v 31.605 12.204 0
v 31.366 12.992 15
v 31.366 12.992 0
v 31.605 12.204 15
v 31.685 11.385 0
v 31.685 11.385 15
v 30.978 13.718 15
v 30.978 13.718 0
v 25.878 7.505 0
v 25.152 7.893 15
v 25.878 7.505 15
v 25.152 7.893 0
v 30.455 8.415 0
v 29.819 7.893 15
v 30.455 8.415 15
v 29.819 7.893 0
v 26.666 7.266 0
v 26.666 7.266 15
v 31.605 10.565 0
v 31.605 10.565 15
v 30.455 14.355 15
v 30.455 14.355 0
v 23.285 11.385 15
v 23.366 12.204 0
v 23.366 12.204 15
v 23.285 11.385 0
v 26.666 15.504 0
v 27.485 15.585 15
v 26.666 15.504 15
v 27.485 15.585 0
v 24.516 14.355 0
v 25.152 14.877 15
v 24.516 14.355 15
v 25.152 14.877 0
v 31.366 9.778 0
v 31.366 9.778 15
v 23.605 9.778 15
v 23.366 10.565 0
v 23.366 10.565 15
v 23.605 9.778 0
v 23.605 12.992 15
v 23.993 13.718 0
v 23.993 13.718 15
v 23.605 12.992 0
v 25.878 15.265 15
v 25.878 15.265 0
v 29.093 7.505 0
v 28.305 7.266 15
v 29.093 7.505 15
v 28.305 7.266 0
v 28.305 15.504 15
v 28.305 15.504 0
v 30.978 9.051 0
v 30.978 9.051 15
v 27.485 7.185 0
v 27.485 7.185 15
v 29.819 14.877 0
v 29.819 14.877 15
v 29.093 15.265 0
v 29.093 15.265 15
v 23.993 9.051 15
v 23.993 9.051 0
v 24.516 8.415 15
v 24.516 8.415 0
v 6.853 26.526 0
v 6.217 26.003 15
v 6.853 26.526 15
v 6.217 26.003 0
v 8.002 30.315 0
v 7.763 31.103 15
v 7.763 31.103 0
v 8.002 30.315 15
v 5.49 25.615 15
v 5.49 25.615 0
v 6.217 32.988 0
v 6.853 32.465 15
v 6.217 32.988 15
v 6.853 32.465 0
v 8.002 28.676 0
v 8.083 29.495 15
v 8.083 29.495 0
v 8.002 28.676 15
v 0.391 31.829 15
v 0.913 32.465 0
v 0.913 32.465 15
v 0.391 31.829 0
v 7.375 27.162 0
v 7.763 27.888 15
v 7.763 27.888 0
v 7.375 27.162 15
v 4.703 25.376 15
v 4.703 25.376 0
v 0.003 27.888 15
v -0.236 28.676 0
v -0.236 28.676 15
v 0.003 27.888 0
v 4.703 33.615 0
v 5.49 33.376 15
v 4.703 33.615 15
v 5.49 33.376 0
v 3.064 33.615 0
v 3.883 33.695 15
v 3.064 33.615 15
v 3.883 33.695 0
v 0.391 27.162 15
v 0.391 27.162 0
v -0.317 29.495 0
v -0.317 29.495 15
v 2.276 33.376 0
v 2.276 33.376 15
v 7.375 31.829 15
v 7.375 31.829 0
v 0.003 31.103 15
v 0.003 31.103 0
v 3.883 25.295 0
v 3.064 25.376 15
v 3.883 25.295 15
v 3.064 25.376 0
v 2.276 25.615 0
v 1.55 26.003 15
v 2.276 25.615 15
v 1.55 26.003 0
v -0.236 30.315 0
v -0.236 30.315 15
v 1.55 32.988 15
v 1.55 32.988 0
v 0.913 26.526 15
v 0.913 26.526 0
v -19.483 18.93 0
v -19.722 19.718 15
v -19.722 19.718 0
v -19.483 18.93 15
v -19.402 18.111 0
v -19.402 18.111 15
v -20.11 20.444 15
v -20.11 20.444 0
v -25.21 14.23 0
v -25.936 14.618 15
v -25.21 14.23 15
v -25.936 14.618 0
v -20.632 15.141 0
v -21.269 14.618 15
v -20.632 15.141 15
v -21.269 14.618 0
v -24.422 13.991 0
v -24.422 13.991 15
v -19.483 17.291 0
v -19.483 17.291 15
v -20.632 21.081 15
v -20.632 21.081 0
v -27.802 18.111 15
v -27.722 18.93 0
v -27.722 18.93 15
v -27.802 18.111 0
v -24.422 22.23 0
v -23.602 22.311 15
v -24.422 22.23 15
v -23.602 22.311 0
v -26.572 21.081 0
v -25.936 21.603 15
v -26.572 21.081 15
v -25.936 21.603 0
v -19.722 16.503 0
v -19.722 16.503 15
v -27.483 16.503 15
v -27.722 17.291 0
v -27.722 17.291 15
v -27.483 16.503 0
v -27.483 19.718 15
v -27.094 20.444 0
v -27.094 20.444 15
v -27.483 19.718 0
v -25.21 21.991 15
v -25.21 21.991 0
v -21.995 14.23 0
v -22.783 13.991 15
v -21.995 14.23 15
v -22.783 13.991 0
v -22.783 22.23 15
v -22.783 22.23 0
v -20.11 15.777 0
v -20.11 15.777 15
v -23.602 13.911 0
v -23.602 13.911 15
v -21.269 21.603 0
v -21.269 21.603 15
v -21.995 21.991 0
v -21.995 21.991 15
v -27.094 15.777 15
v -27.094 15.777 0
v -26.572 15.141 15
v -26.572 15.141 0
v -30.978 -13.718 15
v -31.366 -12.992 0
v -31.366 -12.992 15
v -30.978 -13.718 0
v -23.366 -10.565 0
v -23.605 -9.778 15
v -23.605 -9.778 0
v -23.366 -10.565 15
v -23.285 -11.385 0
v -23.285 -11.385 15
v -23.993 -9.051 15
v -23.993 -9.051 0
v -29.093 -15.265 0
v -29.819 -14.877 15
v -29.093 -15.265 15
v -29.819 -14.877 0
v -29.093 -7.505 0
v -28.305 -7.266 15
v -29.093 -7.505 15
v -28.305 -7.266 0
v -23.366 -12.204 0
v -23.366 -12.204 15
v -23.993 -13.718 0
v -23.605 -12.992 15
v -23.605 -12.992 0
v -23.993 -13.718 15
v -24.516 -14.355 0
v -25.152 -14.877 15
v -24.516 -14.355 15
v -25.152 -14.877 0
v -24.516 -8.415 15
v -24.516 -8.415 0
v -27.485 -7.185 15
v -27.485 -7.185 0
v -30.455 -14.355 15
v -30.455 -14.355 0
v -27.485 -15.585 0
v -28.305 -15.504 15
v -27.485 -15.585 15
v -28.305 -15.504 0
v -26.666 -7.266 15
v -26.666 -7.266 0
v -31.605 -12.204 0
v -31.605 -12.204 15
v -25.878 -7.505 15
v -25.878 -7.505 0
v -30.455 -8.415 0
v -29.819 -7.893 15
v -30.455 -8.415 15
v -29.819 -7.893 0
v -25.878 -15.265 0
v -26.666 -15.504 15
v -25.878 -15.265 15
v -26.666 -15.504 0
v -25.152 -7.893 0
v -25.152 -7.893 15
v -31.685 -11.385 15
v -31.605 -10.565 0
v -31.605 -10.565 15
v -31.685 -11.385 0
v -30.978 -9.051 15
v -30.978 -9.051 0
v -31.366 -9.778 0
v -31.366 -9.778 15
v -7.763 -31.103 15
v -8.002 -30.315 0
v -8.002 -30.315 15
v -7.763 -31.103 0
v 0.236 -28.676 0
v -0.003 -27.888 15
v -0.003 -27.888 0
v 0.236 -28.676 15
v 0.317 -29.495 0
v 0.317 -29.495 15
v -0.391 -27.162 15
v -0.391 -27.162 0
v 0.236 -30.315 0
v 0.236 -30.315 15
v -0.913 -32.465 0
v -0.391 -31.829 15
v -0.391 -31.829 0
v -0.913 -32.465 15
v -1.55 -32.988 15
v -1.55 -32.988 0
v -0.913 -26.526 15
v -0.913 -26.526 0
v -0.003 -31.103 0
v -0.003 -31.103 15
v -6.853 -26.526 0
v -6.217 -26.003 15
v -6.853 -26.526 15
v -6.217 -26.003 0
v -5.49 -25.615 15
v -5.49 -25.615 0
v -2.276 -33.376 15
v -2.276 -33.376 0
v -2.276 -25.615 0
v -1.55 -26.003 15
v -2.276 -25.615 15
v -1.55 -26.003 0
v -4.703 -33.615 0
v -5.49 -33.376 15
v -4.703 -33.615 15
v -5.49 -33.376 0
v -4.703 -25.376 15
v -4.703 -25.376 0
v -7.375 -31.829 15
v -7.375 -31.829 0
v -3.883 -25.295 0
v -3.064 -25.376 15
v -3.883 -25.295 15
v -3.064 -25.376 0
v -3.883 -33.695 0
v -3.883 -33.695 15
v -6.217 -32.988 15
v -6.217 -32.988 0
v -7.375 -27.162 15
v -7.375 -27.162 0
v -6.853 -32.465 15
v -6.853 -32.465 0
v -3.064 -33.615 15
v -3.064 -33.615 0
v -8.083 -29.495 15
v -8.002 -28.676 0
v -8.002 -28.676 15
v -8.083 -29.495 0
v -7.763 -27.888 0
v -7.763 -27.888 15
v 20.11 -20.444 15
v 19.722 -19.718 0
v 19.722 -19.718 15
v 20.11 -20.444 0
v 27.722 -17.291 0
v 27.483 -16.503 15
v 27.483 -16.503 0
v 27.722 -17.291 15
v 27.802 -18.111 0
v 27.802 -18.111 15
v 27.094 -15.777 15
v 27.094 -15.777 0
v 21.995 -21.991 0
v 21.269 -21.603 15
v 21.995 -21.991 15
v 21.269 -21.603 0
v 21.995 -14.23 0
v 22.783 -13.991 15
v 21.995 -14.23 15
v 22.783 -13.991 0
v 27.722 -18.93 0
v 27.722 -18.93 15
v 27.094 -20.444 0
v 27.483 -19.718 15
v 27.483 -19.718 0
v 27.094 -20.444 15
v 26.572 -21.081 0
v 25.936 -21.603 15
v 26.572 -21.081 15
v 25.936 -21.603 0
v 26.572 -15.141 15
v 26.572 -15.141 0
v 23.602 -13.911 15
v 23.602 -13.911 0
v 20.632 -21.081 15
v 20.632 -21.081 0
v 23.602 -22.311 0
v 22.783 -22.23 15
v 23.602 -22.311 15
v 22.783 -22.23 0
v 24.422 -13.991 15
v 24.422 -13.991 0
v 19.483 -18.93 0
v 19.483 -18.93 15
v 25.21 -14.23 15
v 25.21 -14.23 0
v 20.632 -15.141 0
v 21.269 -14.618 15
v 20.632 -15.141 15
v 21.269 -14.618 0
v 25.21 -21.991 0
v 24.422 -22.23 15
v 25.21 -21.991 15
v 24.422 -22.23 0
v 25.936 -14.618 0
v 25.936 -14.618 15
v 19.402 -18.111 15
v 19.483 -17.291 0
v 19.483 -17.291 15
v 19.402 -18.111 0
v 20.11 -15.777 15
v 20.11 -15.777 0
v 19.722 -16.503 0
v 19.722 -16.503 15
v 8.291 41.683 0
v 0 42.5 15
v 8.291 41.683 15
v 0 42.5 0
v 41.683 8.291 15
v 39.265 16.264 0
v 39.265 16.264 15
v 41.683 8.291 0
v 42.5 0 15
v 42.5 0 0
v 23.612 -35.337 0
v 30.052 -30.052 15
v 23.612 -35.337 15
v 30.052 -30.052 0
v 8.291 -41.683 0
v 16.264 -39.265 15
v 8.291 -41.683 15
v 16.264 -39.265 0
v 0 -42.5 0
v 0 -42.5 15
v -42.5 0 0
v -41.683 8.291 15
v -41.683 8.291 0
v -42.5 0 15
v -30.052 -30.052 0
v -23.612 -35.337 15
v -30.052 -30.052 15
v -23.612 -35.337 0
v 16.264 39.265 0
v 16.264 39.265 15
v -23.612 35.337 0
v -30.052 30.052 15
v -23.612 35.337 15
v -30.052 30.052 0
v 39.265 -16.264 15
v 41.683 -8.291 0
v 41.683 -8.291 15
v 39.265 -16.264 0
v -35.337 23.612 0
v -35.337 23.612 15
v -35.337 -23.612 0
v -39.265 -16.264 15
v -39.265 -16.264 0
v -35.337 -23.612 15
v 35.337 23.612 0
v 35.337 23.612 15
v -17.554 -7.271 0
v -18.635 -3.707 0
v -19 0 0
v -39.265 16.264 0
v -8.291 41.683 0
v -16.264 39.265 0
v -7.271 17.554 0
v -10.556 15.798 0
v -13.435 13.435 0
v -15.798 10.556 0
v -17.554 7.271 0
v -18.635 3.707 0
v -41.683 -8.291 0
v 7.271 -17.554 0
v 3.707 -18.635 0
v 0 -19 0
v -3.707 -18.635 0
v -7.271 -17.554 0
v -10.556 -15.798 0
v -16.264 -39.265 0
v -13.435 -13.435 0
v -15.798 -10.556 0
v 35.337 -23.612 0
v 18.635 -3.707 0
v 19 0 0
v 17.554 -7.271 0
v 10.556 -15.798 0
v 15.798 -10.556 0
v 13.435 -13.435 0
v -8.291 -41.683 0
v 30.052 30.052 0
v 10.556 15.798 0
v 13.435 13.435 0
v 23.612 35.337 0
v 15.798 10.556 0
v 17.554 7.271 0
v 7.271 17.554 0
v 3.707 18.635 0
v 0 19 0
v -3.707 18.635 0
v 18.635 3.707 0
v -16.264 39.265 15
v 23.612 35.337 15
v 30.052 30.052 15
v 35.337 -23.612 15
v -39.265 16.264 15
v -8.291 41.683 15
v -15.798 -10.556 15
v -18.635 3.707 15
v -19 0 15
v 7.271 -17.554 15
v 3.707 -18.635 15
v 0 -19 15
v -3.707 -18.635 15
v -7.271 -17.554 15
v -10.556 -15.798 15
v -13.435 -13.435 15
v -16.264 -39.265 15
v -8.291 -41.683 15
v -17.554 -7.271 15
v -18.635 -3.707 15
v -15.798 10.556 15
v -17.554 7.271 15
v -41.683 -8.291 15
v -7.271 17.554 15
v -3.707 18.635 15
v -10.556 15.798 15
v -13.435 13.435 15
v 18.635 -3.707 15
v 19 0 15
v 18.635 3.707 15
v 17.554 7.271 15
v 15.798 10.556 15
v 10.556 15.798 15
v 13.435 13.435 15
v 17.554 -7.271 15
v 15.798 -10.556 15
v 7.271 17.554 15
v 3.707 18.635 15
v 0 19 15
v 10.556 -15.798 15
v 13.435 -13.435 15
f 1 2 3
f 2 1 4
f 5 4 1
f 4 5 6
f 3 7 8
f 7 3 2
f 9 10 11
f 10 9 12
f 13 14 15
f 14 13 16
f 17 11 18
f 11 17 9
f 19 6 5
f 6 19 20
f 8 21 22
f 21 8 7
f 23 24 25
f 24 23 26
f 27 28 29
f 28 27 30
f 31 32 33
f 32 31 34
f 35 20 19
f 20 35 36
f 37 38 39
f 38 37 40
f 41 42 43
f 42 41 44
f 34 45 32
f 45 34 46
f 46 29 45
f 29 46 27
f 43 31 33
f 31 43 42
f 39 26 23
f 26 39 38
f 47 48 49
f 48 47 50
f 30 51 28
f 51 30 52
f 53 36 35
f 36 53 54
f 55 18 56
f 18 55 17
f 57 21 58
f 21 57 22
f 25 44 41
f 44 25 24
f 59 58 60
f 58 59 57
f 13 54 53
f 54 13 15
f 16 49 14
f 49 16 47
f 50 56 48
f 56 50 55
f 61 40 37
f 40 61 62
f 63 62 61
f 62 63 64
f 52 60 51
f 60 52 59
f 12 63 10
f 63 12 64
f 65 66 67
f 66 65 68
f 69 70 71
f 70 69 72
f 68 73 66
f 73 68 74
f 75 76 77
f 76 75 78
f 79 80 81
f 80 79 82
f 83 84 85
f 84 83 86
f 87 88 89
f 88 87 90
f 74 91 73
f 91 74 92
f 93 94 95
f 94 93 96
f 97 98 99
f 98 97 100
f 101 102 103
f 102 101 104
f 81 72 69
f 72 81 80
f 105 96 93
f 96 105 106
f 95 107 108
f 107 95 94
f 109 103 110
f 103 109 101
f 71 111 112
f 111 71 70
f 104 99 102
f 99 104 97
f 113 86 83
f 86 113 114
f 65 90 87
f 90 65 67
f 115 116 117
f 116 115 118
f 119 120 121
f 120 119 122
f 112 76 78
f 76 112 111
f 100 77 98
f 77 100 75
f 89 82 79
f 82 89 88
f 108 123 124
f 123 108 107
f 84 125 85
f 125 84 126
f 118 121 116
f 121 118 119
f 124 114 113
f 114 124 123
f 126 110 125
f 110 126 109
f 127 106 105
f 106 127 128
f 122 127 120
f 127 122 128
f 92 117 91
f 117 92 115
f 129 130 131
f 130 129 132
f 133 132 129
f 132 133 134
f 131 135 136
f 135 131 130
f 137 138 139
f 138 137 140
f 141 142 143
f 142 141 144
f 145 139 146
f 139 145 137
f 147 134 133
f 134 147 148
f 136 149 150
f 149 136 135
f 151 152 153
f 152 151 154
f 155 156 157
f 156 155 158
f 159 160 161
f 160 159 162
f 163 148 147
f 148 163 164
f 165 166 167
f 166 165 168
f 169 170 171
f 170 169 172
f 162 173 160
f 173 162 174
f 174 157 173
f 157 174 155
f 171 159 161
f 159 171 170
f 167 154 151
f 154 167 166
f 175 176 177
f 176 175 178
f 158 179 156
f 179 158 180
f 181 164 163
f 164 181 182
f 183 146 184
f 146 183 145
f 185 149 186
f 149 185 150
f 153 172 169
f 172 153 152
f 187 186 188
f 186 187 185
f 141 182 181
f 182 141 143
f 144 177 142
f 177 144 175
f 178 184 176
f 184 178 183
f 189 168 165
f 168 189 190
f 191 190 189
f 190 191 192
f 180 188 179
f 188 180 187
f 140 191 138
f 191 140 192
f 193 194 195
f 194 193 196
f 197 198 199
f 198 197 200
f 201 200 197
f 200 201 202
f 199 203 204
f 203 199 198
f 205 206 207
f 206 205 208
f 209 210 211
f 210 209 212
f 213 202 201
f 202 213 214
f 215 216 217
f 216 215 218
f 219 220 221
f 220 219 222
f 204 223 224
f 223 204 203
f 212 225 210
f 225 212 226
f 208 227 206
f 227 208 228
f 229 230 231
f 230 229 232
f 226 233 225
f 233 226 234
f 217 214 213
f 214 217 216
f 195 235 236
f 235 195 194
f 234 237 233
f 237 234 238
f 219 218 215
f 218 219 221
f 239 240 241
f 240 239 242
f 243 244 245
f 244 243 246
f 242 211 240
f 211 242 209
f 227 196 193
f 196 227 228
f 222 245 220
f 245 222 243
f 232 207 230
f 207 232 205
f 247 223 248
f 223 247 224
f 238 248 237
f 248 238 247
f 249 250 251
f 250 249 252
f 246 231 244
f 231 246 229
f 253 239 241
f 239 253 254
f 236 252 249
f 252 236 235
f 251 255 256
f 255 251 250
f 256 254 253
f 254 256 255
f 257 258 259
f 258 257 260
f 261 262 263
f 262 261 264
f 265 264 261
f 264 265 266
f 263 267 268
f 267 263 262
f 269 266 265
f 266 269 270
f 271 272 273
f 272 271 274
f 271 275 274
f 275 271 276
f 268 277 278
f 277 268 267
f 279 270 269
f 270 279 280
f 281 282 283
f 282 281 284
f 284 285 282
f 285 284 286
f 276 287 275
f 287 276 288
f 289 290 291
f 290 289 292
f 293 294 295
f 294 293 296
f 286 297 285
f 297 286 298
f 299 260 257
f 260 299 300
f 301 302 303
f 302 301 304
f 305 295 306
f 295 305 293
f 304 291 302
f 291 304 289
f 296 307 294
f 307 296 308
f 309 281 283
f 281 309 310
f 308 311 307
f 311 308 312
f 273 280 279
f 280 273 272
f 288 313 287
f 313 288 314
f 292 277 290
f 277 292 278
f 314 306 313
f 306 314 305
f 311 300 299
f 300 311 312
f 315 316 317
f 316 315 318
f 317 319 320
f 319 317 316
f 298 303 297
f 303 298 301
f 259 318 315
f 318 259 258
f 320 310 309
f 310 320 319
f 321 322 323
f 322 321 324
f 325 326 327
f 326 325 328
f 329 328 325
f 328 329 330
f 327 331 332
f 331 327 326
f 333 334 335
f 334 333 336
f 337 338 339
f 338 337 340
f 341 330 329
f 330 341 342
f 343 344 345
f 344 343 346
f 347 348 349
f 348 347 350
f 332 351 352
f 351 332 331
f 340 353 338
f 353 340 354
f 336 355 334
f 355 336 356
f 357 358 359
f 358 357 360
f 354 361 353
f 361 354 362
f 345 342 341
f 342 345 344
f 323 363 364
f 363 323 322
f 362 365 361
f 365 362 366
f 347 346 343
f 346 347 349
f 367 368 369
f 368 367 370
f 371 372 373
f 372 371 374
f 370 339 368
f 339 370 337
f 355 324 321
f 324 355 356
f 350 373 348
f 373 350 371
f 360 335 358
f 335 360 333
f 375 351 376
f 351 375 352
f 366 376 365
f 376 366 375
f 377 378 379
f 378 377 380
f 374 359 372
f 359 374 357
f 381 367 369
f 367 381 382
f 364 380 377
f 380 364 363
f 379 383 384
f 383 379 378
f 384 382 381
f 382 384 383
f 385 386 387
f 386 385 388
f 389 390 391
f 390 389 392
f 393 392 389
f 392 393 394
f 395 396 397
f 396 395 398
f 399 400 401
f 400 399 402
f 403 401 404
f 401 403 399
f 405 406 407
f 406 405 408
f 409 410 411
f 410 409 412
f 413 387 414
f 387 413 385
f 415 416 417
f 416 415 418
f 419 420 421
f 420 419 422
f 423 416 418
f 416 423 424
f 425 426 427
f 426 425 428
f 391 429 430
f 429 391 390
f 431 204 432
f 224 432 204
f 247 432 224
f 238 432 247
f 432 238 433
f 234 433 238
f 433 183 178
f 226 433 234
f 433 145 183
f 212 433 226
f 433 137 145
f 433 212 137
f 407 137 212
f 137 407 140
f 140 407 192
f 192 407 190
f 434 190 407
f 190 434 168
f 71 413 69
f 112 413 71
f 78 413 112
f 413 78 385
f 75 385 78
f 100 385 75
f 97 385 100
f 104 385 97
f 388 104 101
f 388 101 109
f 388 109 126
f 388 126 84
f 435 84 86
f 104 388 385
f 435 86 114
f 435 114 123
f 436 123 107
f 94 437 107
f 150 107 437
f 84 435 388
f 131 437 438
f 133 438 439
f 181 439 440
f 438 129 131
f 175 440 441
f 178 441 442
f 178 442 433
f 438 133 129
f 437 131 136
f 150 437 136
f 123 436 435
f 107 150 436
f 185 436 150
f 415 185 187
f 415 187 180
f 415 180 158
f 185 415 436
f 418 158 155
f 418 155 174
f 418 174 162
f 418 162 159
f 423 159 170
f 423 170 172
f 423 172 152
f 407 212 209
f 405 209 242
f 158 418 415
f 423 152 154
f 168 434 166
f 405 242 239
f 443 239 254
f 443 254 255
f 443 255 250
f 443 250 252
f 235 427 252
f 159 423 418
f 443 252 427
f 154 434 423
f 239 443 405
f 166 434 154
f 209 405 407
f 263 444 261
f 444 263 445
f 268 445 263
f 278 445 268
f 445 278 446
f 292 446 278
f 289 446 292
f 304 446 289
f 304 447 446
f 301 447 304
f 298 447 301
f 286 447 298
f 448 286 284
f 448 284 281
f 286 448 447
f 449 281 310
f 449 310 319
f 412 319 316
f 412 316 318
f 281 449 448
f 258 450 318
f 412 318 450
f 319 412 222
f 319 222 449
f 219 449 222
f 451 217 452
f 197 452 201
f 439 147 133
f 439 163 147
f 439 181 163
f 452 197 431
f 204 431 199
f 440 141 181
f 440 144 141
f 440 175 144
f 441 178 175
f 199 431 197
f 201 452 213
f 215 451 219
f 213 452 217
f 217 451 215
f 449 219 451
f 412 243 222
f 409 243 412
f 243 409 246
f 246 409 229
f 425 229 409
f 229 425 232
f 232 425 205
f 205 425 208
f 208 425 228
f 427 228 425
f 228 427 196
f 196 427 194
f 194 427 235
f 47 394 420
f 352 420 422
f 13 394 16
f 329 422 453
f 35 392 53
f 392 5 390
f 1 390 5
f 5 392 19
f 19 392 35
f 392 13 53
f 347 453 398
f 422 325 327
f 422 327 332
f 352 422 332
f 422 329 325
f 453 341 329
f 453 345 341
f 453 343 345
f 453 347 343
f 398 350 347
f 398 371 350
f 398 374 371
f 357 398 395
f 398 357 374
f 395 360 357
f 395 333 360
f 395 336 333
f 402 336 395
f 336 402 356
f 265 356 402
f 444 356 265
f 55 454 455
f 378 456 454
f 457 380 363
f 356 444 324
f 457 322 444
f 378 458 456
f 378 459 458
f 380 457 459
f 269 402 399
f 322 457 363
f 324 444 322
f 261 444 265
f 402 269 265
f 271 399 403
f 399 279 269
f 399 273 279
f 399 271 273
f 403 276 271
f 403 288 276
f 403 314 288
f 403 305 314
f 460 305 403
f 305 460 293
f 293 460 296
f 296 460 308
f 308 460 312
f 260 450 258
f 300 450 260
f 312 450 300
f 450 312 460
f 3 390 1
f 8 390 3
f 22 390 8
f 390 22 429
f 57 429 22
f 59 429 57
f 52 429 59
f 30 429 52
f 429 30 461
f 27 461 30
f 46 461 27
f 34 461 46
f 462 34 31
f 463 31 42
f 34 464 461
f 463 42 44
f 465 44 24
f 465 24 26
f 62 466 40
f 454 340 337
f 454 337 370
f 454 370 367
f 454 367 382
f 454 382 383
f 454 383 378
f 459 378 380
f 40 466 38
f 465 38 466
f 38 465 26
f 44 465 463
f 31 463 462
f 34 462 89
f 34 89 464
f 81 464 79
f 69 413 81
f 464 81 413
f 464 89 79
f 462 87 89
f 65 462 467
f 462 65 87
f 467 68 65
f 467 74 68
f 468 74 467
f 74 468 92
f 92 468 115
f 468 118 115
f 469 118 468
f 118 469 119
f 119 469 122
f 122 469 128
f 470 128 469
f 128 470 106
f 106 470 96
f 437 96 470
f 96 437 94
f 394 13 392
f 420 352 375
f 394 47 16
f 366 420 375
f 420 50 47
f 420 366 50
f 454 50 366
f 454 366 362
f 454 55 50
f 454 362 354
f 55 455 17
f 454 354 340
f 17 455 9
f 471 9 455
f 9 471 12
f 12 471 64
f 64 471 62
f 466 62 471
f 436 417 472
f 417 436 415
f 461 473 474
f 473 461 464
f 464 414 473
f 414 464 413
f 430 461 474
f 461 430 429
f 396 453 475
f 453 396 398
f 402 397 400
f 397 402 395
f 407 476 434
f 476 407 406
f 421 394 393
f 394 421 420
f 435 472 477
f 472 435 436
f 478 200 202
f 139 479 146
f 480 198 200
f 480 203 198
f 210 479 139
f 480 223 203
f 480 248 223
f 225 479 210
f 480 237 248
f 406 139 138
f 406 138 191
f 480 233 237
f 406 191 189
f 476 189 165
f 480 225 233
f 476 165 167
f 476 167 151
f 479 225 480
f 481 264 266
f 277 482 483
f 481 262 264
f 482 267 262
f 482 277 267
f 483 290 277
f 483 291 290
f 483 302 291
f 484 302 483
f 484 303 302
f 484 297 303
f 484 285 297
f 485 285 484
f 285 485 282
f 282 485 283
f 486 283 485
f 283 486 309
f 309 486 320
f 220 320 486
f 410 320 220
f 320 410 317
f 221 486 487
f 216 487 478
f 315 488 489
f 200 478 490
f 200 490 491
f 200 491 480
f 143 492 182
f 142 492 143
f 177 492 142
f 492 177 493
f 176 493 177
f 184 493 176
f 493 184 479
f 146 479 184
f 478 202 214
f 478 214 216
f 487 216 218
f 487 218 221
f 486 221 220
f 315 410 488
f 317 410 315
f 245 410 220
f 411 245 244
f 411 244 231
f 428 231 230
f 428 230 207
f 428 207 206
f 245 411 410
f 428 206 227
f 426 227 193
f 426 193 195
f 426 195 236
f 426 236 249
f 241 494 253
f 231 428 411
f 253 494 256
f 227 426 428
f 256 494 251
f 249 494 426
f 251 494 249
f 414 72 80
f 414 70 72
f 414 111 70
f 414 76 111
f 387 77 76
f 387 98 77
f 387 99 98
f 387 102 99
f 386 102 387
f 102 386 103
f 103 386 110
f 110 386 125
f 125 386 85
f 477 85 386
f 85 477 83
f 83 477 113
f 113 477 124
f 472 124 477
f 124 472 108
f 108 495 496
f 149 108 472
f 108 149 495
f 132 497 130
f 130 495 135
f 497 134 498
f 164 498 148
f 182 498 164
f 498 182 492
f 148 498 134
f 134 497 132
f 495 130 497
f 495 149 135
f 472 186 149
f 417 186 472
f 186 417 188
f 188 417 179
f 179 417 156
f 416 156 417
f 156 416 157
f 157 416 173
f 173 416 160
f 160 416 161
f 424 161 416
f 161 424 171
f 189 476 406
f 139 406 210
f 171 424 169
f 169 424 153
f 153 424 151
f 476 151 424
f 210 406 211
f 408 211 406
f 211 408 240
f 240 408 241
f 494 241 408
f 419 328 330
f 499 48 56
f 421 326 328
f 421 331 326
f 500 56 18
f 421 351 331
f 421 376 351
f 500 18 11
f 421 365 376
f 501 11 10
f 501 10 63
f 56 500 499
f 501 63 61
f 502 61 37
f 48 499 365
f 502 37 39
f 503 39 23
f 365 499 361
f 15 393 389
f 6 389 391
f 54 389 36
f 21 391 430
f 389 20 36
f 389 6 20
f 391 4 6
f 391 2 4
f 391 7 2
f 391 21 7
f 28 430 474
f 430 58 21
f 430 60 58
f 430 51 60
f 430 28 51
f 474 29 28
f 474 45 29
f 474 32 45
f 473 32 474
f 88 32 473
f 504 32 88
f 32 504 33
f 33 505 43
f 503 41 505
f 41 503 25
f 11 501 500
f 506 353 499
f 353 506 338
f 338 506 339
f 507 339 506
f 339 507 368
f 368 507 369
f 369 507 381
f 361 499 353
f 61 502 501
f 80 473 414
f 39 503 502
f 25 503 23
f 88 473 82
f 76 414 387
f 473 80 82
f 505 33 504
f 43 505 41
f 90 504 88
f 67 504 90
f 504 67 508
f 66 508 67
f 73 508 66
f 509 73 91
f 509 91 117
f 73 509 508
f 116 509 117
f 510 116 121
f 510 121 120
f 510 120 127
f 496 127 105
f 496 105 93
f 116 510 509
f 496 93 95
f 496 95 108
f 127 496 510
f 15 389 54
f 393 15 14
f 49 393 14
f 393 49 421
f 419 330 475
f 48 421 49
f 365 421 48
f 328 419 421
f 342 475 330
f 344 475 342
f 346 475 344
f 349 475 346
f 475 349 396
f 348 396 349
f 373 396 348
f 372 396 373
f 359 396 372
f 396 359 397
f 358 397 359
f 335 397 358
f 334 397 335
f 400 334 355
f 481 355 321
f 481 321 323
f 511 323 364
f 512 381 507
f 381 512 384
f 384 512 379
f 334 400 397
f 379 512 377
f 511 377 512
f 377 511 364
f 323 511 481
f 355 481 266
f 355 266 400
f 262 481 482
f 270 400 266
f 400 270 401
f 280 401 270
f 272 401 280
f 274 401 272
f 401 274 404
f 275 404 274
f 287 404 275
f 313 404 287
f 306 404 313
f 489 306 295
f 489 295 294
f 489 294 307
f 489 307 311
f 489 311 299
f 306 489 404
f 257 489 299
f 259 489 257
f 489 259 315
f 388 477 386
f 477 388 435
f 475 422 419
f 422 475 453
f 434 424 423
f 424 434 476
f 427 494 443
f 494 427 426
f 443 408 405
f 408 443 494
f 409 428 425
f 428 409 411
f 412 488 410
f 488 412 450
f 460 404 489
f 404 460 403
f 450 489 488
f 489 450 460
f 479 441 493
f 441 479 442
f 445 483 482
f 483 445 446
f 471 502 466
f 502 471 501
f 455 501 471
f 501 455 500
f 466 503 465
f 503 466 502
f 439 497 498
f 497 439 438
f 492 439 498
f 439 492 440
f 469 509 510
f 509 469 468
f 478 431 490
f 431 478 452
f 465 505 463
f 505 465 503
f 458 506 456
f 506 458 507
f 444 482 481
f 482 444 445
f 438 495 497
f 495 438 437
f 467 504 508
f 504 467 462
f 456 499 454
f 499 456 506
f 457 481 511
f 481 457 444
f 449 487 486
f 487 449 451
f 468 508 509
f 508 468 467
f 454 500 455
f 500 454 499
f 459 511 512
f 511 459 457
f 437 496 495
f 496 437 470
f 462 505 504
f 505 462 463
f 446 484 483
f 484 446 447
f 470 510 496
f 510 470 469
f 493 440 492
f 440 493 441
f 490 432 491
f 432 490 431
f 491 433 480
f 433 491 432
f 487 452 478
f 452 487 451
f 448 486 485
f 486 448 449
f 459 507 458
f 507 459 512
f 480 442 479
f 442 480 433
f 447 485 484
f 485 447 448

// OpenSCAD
$fn = 32;

// ----------------------------------------------------------------------
// Flange Ø85 x 15
// 6 holes on a Ø59.5 bolt circle, bolted joints
// ----------------------------------------------------------------------

// --- parameters (mm) ---
flange_d = 85;     // outside diameter of the flange
thickness = 15;    // flange thickness
holes = 6;         // number of bolt holes
pcd = 59.5;        // bolt circle diameter
start_deg = 22.5;  // angle of the first hole, from +X
hole_d = 8.4;      // bolt hole diameter
bore_d = 38;       // central through bore
hub_d = 50;        // hub outside diameter
hub_h = 0;         // hub height above the flange face (0 = no hub)

// --- derived feature positions (mm) ---
height = thickness + hub_h;  // = 15   overall height of the part
pcd_r = pcd / 2;             // = 29.75   bolt circle radius
hole_step = 360 / holes;     // = 60   angular pitch
feature_centers = [
  [pcd_r * cos(start_deg + 0 * hole_step), pcd_r * sin(start_deg + 0 * hole_step)],
  [pcd_r * cos(start_deg + 1 * hole_step), pcd_r * sin(start_deg + 1 * hole_step)],
  [pcd_r * cos(start_deg + 2 * hole_step), pcd_r * sin(start_deg + 2 * hole_step)],
  [pcd_r * cos(start_deg + 3 * hole_step), pcd_r * sin(start_deg + 3 * hole_step)],
  [pcd_r * cos(start_deg + 4 * hole_step), pcd_r * sin(start_deg + 4 * hole_step)],
  [pcd_r * cos(start_deg + 5 * hole_step), pcd_r * sin(start_deg + 5 * hole_step)]
];   // bolt hole centres on the pitch circle

// flange disc, every hole and the bore cut straight through
difference() {
  union() {
    cylinder(d = flange_d, h = thickness);
  }
  translate([0, 0, -1]) cylinder(d = bore_d, h = height + 2);  // bore, through
  for (centre = feature_centers)
    translate([centre[0], centre[1], -1]) cylinder(d = hole_d, h = thickness + 2);
}
